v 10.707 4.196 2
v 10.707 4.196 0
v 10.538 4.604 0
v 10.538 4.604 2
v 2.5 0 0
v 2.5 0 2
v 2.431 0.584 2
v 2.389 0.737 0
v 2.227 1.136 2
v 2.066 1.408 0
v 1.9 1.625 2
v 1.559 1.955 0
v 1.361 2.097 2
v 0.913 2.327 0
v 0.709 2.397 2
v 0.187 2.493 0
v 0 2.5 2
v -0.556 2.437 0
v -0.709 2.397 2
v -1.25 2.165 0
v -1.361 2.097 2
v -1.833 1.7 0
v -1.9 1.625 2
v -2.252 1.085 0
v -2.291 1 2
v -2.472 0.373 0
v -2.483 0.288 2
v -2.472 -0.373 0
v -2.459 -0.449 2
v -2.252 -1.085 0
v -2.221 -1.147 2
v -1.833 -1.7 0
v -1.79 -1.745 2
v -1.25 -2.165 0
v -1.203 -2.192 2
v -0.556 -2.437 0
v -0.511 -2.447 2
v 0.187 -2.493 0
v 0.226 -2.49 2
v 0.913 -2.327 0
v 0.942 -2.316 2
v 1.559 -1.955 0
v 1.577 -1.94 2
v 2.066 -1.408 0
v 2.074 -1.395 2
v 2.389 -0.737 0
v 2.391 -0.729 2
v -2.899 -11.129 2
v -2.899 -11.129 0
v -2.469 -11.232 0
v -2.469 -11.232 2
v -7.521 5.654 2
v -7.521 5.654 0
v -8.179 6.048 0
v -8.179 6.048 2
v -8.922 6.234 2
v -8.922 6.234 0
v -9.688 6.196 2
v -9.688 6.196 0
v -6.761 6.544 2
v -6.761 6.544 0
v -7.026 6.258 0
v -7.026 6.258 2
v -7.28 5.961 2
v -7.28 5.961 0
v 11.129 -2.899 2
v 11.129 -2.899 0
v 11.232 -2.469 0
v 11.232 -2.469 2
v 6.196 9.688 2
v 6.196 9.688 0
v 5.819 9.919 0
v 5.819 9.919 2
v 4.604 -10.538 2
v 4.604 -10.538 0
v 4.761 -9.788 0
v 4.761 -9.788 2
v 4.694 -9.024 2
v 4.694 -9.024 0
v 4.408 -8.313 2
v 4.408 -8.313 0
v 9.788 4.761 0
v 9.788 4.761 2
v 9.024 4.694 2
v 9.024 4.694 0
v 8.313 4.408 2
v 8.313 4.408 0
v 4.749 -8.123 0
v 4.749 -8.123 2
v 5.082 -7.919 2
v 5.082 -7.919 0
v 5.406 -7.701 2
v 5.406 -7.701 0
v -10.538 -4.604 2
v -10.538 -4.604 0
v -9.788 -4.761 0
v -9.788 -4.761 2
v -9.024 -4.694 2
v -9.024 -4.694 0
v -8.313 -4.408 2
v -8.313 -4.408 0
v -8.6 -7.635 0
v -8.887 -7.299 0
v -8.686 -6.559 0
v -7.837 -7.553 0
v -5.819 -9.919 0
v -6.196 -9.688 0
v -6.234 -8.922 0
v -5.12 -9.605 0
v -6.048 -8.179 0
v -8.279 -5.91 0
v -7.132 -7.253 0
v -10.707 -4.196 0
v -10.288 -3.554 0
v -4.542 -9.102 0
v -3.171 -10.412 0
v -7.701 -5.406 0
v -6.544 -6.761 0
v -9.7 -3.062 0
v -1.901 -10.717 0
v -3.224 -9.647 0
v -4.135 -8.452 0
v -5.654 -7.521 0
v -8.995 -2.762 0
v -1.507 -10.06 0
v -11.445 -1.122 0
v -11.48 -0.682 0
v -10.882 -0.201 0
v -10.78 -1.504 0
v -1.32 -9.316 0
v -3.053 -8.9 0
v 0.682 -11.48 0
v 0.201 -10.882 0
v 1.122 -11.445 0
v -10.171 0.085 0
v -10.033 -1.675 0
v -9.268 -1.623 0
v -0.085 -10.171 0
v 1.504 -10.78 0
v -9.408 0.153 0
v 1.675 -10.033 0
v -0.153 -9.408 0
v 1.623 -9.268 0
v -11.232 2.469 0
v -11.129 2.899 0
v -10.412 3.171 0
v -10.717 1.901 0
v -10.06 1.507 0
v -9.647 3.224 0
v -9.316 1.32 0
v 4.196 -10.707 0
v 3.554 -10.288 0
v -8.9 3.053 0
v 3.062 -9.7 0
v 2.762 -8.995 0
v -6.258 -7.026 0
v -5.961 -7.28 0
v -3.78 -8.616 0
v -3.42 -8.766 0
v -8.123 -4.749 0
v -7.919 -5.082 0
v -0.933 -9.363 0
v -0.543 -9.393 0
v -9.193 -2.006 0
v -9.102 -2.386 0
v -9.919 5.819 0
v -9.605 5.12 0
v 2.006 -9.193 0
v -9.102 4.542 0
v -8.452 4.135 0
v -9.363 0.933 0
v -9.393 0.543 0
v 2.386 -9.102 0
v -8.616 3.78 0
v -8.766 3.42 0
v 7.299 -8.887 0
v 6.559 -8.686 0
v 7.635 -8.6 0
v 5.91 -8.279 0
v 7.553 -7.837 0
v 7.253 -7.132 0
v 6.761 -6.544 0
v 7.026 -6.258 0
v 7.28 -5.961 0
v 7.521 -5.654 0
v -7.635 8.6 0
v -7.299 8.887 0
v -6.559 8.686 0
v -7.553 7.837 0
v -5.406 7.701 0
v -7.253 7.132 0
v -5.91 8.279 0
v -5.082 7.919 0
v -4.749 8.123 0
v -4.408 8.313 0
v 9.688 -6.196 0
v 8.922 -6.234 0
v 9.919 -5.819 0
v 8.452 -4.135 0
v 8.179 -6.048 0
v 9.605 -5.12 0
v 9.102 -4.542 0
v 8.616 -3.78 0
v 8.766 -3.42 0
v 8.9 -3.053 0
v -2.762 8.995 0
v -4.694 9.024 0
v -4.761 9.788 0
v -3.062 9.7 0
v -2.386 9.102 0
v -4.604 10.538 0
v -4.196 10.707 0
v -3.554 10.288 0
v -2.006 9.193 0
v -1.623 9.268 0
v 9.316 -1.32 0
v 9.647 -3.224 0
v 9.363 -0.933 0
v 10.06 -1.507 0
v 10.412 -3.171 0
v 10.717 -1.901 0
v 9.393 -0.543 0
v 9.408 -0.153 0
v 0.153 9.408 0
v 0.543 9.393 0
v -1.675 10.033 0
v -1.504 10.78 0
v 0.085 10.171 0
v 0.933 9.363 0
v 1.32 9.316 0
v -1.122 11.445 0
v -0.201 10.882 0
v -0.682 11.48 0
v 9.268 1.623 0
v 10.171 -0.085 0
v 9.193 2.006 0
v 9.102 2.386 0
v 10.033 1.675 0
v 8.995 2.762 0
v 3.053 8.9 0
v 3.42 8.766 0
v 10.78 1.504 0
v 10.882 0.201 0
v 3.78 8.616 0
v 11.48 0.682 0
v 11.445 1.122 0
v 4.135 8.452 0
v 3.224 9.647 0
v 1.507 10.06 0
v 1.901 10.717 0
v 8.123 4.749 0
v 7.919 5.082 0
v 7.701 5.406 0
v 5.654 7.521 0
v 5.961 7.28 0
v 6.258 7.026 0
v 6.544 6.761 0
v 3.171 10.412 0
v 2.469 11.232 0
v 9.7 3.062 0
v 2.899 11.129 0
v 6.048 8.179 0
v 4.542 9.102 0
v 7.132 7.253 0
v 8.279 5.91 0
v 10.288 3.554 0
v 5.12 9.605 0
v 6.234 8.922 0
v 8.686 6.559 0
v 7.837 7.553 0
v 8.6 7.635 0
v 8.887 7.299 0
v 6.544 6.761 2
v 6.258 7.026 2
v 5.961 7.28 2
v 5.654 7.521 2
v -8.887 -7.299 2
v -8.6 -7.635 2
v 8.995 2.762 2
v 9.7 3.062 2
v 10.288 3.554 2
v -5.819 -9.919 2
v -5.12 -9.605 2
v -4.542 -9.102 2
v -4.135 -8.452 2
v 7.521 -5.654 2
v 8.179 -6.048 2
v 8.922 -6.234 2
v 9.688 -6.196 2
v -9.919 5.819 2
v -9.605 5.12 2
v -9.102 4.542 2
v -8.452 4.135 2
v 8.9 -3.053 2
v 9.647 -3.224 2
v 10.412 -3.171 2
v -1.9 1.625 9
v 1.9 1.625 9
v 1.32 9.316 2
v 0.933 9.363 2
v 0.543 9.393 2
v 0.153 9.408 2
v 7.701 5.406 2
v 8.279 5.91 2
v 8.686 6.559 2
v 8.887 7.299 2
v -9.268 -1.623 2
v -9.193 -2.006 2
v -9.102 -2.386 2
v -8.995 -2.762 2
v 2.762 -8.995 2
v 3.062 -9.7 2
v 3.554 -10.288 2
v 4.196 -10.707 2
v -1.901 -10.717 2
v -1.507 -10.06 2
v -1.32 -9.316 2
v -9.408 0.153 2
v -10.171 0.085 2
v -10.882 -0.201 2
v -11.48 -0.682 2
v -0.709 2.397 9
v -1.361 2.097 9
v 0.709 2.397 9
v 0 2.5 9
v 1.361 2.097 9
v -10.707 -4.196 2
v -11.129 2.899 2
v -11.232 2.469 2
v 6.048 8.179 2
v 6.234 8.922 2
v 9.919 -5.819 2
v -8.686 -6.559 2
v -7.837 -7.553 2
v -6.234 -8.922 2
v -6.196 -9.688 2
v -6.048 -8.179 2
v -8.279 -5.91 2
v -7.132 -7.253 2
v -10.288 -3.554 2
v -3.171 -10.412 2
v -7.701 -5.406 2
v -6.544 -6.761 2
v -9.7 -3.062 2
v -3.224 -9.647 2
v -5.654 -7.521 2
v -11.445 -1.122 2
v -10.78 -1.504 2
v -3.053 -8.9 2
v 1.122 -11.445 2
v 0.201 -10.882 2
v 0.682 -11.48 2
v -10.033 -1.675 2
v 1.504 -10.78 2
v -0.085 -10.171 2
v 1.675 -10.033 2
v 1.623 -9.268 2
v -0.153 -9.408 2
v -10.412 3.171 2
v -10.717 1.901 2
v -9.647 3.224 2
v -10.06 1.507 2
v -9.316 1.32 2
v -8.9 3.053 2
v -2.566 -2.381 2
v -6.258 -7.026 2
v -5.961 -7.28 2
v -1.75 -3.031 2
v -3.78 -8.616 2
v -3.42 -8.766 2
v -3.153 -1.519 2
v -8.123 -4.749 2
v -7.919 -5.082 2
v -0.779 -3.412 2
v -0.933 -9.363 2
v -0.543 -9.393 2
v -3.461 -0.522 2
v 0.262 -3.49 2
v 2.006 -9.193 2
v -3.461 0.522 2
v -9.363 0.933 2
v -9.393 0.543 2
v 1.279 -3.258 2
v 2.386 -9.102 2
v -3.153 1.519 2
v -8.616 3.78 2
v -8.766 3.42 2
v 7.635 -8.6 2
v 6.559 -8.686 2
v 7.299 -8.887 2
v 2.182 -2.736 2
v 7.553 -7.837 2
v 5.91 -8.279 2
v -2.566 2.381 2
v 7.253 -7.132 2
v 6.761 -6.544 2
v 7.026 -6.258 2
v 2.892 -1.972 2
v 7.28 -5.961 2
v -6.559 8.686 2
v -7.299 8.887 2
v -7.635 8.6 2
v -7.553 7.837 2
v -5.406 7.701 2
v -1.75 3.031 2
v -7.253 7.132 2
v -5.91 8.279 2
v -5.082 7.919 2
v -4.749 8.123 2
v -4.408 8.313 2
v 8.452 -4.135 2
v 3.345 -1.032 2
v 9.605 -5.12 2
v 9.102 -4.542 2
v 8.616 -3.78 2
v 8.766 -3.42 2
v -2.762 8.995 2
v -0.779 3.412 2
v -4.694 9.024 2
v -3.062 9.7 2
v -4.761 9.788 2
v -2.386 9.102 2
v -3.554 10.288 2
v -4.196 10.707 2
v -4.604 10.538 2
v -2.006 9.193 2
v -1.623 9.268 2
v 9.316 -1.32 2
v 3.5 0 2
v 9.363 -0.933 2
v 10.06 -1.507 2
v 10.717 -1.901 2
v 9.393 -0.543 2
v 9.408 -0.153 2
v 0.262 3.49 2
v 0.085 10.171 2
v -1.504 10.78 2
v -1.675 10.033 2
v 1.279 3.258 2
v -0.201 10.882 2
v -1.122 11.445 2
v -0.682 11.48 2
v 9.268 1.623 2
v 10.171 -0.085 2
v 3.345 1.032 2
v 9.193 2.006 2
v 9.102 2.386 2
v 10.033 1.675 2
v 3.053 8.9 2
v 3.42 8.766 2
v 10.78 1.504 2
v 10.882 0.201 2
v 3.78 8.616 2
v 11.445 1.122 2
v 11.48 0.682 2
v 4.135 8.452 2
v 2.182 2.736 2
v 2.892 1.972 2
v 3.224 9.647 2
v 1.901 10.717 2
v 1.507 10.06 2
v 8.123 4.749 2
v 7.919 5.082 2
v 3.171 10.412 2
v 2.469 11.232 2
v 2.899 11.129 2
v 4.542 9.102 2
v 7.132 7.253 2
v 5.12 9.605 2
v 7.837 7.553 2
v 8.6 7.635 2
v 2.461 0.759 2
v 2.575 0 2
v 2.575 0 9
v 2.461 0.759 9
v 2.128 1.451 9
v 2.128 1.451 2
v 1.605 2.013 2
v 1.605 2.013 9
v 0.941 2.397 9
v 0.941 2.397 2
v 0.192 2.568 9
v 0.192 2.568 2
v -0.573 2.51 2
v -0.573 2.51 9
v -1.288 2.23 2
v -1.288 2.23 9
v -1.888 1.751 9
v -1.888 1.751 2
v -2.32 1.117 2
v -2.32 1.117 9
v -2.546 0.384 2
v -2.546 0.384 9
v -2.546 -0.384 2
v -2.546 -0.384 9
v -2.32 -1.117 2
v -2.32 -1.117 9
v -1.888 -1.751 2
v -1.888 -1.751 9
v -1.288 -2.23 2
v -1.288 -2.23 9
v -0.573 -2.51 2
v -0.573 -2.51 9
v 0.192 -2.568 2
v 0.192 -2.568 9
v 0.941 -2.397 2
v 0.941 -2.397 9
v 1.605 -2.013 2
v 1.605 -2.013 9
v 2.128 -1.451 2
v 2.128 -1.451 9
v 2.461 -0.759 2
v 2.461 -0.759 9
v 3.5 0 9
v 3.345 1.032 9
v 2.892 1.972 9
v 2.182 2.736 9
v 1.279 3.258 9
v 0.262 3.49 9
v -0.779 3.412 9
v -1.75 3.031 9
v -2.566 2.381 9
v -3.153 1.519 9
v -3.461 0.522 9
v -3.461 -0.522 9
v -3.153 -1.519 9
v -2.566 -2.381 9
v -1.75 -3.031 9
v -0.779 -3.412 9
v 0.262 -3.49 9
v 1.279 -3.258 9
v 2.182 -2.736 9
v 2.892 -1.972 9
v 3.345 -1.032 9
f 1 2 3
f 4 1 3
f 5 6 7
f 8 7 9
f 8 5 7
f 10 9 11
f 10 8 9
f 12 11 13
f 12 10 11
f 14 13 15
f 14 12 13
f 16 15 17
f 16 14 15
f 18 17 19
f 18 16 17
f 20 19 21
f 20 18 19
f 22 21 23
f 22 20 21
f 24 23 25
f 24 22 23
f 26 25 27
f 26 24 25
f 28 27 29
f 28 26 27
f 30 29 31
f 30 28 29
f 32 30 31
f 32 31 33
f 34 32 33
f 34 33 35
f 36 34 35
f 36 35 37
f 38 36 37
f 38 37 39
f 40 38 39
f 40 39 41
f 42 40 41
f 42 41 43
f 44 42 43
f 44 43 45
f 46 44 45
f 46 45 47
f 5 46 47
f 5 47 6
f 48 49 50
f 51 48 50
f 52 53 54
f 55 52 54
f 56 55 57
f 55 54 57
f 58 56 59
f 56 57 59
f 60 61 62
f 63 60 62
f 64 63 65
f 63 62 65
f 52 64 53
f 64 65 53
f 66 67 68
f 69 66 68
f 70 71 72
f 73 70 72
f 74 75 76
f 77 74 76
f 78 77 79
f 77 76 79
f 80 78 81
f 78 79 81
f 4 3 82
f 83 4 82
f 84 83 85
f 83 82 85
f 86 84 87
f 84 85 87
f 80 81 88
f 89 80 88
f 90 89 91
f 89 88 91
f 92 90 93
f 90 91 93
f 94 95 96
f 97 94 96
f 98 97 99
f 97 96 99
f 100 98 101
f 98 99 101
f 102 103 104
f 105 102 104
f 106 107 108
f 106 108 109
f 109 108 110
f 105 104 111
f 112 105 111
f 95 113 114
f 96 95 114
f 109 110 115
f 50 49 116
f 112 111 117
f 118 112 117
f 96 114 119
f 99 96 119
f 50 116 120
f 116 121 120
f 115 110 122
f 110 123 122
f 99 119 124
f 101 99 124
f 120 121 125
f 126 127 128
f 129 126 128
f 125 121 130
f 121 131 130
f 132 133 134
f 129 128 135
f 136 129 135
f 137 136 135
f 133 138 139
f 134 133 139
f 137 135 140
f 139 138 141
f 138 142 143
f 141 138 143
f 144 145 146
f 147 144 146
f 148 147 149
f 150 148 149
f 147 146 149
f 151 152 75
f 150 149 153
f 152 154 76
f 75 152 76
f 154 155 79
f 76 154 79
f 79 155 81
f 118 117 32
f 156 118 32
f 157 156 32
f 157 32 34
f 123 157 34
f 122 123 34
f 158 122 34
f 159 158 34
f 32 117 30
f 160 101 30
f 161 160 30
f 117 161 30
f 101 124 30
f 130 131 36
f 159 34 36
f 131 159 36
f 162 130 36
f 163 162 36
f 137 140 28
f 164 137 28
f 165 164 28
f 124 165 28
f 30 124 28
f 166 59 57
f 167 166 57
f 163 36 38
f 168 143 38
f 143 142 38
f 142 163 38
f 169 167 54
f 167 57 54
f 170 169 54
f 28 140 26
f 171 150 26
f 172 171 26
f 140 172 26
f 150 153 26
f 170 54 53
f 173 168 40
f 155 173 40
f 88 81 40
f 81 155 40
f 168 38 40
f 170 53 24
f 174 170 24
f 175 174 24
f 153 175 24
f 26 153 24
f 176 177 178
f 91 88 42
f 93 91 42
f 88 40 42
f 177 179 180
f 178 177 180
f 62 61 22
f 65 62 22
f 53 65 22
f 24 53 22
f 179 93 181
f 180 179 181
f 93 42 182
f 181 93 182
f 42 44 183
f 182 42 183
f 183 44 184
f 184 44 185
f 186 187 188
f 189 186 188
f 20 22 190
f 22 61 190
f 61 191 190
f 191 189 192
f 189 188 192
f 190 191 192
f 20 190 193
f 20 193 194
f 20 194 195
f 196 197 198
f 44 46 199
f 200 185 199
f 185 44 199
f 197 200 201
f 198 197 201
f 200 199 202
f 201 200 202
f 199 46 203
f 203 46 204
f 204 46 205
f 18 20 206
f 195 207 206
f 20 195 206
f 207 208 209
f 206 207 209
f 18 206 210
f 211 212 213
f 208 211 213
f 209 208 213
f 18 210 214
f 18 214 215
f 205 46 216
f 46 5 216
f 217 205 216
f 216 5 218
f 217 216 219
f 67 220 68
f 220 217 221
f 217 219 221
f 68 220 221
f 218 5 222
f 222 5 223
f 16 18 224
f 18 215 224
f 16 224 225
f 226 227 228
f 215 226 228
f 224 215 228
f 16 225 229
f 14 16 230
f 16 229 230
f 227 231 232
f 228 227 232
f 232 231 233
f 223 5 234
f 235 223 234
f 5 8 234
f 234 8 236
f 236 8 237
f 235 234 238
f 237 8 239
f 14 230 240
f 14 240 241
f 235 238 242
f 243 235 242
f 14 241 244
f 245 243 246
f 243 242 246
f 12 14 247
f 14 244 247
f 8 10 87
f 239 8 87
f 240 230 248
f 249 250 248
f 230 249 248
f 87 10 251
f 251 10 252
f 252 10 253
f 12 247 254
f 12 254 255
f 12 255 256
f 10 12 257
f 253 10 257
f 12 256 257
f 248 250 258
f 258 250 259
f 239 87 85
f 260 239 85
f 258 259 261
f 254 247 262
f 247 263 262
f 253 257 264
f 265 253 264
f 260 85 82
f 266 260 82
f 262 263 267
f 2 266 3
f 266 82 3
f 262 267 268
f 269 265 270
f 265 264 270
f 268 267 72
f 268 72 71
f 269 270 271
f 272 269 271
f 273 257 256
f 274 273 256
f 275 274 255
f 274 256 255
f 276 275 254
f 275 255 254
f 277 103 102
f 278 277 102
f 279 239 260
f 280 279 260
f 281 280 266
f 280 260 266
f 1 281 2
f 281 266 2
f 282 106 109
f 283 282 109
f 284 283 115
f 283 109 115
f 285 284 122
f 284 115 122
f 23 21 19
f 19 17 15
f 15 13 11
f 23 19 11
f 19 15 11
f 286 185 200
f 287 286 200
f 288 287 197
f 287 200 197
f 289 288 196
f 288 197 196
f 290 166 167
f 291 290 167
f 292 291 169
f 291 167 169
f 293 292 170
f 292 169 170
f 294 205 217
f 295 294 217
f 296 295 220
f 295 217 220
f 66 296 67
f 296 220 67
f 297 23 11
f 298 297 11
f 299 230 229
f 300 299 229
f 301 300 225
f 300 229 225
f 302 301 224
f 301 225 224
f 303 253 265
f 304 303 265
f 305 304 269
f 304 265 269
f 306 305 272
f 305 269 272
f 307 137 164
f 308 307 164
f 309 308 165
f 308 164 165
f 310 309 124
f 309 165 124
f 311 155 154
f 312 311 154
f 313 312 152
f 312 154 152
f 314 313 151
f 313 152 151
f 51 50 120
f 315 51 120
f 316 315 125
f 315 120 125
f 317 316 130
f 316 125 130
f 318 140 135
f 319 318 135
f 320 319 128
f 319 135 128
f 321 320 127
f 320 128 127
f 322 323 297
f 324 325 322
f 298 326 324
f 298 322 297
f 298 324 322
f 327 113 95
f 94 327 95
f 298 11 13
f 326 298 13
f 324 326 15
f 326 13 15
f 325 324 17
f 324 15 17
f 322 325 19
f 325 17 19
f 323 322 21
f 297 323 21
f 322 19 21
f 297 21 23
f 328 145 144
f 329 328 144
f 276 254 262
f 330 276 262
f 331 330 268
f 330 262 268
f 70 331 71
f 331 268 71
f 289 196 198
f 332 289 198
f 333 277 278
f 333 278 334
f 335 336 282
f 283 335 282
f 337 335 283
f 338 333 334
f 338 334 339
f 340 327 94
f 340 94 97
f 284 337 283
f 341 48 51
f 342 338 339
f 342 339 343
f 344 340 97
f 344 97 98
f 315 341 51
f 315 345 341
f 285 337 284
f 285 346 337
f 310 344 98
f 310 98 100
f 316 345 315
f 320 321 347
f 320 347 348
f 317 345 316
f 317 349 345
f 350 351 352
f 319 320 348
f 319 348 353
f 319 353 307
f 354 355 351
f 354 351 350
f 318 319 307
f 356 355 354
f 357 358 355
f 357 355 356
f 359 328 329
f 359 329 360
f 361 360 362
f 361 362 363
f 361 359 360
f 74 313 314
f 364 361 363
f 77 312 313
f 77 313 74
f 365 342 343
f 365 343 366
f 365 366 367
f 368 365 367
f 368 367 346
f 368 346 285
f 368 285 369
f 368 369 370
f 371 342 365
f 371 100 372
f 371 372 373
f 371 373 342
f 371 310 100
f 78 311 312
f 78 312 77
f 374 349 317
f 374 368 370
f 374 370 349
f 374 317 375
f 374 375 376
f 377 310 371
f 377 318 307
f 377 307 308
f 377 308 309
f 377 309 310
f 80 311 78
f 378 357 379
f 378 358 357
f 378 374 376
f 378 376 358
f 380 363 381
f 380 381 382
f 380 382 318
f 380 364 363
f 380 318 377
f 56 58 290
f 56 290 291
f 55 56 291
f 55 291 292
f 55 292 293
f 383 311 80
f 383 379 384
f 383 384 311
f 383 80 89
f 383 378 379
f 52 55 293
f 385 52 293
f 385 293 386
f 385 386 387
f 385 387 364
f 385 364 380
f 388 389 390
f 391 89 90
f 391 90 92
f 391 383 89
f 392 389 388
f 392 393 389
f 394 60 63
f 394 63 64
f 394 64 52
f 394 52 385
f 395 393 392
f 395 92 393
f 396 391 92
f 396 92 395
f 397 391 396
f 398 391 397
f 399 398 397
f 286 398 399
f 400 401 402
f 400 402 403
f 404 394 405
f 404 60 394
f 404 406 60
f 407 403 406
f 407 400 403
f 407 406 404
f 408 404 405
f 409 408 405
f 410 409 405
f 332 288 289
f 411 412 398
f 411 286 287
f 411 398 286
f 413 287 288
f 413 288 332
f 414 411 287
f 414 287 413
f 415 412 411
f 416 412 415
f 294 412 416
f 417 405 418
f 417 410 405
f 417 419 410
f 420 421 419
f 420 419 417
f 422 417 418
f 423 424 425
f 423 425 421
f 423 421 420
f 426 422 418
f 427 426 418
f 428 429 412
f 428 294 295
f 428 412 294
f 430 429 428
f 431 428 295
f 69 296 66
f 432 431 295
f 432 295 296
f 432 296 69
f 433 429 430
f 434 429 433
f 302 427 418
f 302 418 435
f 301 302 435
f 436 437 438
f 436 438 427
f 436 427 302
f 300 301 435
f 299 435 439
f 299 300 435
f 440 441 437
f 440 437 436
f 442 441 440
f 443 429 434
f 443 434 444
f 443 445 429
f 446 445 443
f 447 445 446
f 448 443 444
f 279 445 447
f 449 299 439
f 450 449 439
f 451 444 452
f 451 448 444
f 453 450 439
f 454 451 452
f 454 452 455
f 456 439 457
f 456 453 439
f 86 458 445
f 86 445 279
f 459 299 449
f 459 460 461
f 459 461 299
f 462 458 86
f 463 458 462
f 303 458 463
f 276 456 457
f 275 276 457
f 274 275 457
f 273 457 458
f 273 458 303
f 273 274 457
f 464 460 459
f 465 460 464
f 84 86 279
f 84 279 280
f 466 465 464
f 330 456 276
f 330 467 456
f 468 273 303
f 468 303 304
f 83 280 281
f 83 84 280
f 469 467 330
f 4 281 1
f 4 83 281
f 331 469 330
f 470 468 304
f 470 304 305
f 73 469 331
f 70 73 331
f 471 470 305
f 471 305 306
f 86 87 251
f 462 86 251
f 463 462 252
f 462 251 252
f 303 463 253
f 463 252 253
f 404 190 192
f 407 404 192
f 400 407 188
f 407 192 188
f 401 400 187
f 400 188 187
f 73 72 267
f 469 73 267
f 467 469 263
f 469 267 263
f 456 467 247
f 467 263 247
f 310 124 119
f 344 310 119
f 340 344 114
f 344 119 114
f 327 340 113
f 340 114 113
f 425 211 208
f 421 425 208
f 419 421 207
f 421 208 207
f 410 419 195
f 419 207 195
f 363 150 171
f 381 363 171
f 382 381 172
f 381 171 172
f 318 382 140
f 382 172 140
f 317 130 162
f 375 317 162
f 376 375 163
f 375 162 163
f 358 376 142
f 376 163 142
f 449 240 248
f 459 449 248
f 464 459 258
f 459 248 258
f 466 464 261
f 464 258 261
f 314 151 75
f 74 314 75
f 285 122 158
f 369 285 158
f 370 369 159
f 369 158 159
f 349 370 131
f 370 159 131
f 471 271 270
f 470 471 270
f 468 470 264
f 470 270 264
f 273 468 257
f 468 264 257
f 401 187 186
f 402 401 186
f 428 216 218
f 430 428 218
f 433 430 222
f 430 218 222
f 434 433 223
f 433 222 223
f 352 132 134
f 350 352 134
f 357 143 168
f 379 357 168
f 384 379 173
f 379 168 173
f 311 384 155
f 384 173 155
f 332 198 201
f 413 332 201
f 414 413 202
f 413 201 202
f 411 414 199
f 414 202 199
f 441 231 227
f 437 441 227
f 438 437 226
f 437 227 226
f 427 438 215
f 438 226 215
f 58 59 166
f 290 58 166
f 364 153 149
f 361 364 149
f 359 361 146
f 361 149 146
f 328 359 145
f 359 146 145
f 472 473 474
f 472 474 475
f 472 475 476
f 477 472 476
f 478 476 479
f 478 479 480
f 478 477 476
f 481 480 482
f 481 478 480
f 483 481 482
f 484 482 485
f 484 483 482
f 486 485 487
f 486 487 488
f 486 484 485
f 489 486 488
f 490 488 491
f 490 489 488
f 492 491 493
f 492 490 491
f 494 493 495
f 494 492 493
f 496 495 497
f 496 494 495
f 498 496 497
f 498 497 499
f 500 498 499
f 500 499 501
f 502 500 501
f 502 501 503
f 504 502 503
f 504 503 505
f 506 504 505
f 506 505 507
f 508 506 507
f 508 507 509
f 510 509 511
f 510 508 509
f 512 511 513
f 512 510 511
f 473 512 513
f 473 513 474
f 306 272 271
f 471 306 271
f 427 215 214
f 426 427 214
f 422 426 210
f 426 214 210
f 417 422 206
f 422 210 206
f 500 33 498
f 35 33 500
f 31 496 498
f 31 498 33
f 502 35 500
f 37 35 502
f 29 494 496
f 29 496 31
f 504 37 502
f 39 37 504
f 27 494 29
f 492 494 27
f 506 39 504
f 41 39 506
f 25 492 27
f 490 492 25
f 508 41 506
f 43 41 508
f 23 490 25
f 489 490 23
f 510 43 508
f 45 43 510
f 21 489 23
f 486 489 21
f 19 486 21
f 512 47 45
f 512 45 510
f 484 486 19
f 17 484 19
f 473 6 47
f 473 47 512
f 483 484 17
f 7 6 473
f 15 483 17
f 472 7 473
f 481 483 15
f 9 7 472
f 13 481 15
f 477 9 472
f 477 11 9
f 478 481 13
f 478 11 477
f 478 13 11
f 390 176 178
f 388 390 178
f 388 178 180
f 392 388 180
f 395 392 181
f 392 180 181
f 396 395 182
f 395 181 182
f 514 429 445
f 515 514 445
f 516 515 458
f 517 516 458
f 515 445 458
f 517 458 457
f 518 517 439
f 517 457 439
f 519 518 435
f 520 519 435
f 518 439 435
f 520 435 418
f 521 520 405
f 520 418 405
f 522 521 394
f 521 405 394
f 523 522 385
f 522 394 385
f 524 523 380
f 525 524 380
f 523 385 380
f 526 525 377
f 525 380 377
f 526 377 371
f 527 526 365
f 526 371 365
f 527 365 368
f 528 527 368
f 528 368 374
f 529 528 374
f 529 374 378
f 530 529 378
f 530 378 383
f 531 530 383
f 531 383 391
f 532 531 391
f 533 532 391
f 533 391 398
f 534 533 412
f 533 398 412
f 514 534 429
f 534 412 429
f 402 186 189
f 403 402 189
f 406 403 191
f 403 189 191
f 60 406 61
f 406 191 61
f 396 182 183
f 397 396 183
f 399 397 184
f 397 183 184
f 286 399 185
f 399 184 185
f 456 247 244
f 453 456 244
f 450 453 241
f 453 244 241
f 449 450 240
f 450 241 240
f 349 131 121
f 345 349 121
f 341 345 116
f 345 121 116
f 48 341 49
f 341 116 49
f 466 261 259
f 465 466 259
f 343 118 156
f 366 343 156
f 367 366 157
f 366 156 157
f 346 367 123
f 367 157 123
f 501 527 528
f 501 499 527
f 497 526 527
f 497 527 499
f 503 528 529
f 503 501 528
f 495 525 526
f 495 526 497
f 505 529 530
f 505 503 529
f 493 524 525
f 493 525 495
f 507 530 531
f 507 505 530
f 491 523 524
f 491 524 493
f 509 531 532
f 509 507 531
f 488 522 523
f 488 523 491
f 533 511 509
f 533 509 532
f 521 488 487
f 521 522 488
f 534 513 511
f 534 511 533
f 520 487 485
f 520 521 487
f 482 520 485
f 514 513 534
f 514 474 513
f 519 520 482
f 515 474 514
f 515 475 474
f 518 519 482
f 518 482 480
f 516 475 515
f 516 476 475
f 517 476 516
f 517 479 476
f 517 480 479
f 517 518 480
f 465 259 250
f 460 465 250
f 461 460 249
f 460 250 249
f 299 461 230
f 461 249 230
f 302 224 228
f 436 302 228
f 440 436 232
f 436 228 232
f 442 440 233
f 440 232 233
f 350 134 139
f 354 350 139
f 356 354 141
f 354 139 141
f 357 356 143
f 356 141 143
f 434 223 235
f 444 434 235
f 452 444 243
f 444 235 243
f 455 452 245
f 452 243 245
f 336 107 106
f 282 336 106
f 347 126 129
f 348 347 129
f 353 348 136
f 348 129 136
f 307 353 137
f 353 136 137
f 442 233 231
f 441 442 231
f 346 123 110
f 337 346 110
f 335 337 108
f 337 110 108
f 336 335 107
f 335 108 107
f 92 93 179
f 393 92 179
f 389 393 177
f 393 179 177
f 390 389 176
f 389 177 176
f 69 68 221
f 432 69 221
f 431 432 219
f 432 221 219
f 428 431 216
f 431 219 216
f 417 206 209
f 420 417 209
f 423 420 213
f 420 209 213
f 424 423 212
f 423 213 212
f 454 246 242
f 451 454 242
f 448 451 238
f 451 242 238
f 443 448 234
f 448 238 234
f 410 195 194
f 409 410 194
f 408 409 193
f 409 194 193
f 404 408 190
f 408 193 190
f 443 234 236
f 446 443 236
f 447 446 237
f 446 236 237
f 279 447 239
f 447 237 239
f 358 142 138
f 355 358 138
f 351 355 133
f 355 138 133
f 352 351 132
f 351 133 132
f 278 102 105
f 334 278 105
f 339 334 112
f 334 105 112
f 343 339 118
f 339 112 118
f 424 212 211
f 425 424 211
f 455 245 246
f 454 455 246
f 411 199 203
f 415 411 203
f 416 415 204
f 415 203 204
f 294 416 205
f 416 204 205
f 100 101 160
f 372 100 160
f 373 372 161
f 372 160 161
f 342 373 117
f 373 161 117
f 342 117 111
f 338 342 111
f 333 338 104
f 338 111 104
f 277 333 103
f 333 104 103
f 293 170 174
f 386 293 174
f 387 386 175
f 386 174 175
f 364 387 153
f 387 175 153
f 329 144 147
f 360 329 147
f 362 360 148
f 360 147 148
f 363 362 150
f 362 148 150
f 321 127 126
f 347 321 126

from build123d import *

# Parameters (mm, degrees)
F1_R     = 2.5
F2_DEPTH = 2
F3_R     = 3.5
F3_R_2   = 2.575
F4_DEPTH = 7


with BuildPart() as f2:
    # F1 (on Top) → F2 (new body)
    with BuildSketch(Plane.XY):
        with BuildLine():
            ThreePointArc((-1.6229776334, 9.2680599554), (-0.7382287643, 9.3800858219), (0.1531520845, 9.4078443957))
            ThreePointArc((0.1531520845, 9.4078443957), (-0.0317997207, 10.5374998224), (-0.6817601701, 11.4797736507))
            Line((-0.6817601701, 11.4797736507), (-1.1224656787, 11.4450893749))
            ThreePointArc((-1.1224656787, 11.4450893749), (-1.6170199342, 10.4127402859), (-1.6229776334, 9.2680599554))
        make_face()
        with BuildLine():
            ThreePointArc((9.4078443957, -0.1531520845), (9.4087792756, -0.0765785786), (9.4090909091, 0))
            ThreePointArc((9.4090909091, 0), (9.3737668631, 0.8145468262), (9.2680599554, 1.6229776334))
            ThreePointArc((9.2680599554, 1.6229776334), (9.1491169783, 2.1965086508), (8.9947183137, 2.7615275108))
            ThreePointArc((8.9947183137, 2.7615275108), (8.6928665104, 3.6007032045), (8.3129211438, 4.4075314852))
            ThreePointArc((8.3129211438, 4.4075314852), (8.0225688191, 4.9162364953), (7.7011265332, 5.4058895526))
            ThreePointArc((7.7011265332, 5.4058895526), (7.1547288581, 6.1107157275), (6.5440556911, 6.7606454461))
            ThreePointArc((6.5440556911, 6.7606454461), (6.1107157275, 7.1547288581), (5.6536948308, 7.52108546))
            ThreePointArc((5.6536948308, 7.52108546), (4.9162364953, 8.0225688191), (4.1346124722, 8.4519803265))
            ThreePointArc((4.1346124722, 8.4519803265), (3.6007032045, 8.6928665104), (3.0528400867, 8.90006512))
            ThreePointArc((3.0528400867, 8.90006512), (2.1965086508, 9.1491169783), (1.320444577, 9.3159764842))
            ThreePointArc((1.320444577, 9.3159764842), (0.7382287643, 9.3800858219), (0.1531520845, 9.4078443957))
            ThreePointArc((0.1531520845, 9.4078443957), (-0.7382287643, 9.3800858219), (-1.6229776334, 9.2680599554))
            ThreePointArc((-1.6229776334, 9.2680599554), (-2.1965086508, 9.1491169783), (-2.7615275108, 8.9947183137))
            ThreePointArc((-2.7615275108, 8.9947183137), (-3.6007032045, 8.6928665104), (-4.4075314852, 8.3129211438))
            ThreePointArc((-4.4075314852, 8.3129211438), (-4.9162364953, 8.0225688191), (-5.4058895526, 7.7011265332))
            ThreePointArc((-5.4058895526, 7.7011265332), (-6.1107157275, 7.1547288581), (-6.7606454461, 6.5440556911))
            ThreePointArc((-6.7606454461, 6.5440556911), (-7.1547288581, 6.1107157275), (-7.52108546, 5.6536948308))
            ThreePointArc((-7.52108546, 5.6536948308), (-8.0225688191, 4.9162364953), (-8.4519803265, 4.1346124722))
            ThreePointArc((-8.4519803265, 4.1346124722), (-8.6928665104, 3.6007032045), (-8.90006512, 3.0528400867))
            ThreePointArc((-8.90006512, 3.0528400867), (-9.1491169783, 2.1965086508), (-9.3159764842, 1.320444577))
            ThreePointArc((-9.3159764842, 1.320444577), (-9.3800858219, 0.7382287643), (-9.4078443957, 0.1531520845))
            ThreePointArc((-9.4078443957, 0.1531520845), (-9.3800858219, -0.7382287643), (-9.2680599554, -1.6229776334))
            ThreePointArc((-9.2680599554, -1.6229776334), (-9.1491169783, -2.1965086508), (-8.9947183137, -2.7615275108))
            ThreePointArc((-8.9947183137, -2.7615275108), (-8.6928665104, -3.6007032045), (-8.3129211438, -4.4075314852))
            ThreePointArc((-8.3129211438, -4.4075314852), (-8.0225688191, -4.9162364953), (-7.7011265332, -5.4058895526))
            ThreePointArc((-7.7011265332, -5.4058895526), (-7.1547288581, -6.1107157275), (-6.5440556911, -6.7606454461))
            ThreePointArc((-6.5440556911, -6.7606454461), (-6.1107157275, -7.1547288581), (-5.6536948308, -7.52108546))
            ThreePointArc((-5.6536948308, -7.52108546), (-4.9162364953, -8.0225688191), (-4.1346124722, -8.4519803265))
            ThreePointArc((-4.1346124722, -8.4519803265), (-3.6007032045, -8.6928665104), (-3.0528400867, -8.90006512))
            ThreePointArc((-3.0528400867, -8.90006512), (-2.1965086508, -9.1491169783), (-1.320444577, -9.3159764842))
            ThreePointArc((-1.320444577, -9.3159764842), (-0.7382287643, -9.3800858219), (-0.1531520845, -9.4078443957))
            ThreePointArc((-0.1531520845, -9.4078443957), (0.7382287643, -9.3800858219), (1.6229776334, -9.2680599554))
            ThreePointArc((1.6229776334, -9.2680599554), (2.1965086508, -9.1491169783), (2.7615275108, -8.9947183137))
            ThreePointArc((2.7615275108, -8.9947183137), (3.6007032045, -8.6928665104), (4.4075314852, -8.3129211438))
            ThreePointArc((4.4075314852, -8.3129211438), (4.9162364953, -8.0225688191), (5.4058895526, -7.7011265332))
            ThreePointArc((5.4058895526, -7.7011265332), (6.1107157275, -7.1547288581), (6.7606454461, -6.5440556911))
            ThreePointArc((6.7606454461, -6.5440556911), (7.1547288581, -6.1107157275), (7.52108546, -5.6536948308))
            ThreePointArc((7.52108546, -5.6536948308), (8.0225688191, -4.9162364953), (8.4519803265, -4.1346124722))
            ThreePointArc((8.4519803265, -4.1346124722), (8.6928665104, -3.6007032045), (8.90006512, -3.0528400867))
            ThreePointArc((8.90006512, -3.0528400867), (9.1491169783, -2.1965086508), (9.3159764842, -1.320444577))
            ThreePointArc((9.3159764842, -1.320444577), (9.3800858219, -0.7382287643), (9.4078443957, -0.1531520845))
        make_face()
        Circle(F1_R, mode=Mode.SUBTRACT)
        with BuildLine():
            ThreePointArc((-4.4075314852, 8.3129211438), (-3.6007032045, 8.6928665104), (-2.7615275108, 8.9947183137))
            ThreePointArc((-2.7615275108, 8.9947183137), (-3.286509855, 10.0119312174), (-4.195837602, 10.7072380574))
            Line((-4.195837602, 10.7072380574), (-4.604255417, 10.5380658593))
            ThreePointArc((-4.604255417, 10.5380658593), (-4.7555910517, 9.4034178615), (-4.4075314852, 8.3129211438))
        make_face()
        with BuildLine():
            ThreePointArc((-6.7606454461, 6.5440556911), (-6.1107157275, 7.1547288581), (-5.4058895526, 7.7011265332))
            ThreePointArc((-5.4058895526, 7.7011265332), (-6.2195135061, 8.5063250277), (-7.2991972152, 8.8866034014))
            Line((-7.2991972152, 8.8866034014), (-7.6353485554, 8.5995030343))
            ThreePointArc((-7.6353485554, 8.5995030343), (-7.428651783, 7.4736233793), (-6.7606454461, 6.5440556911))
        make_face()
        with BuildLine():
            ThreePointArc((-8.4519803265, 4.1346124722), (-8.0225688191, 4.9162364953), (-7.52108546, 5.6536948308))
            ThreePointArc((-7.52108546, 5.6536948308), (-8.5437078414, 6.1680604771), (-9.6880605486, 6.1960860878))
            Line((-9.6880605486, 6.1960860878), (-9.9190405786, 5.8191609361))
            ThreePointArc((-9.9190405786, 5.8191609361), (-9.3745443193, 4.812258569), (-8.4519803265, 4.1346124722))
        make_face()
        with BuildLine():
            ThreePointArc((-9.3159764842, 1.320444577), (-9.1491169783, 2.1965086508), (-8.90006512, 3.0528400867))
            ThreePointArc((-8.90006512, 3.0528400867), (-10.0315845257, 3.2260231917), (-11.1285890147, 2.8990526973))
            Line((-11.1285890147, 2.8990526973), (-11.2317877999, 2.469198821))
            ThreePointArc((-11.2317877999, 2.469198821), (-10.4027911413, 1.679836361), (-9.3159764842, 1.320444577))
        make_face()
        with BuildLine():
            ThreePointArc((-9.2680599554, -1.6229776334), (-9.3800858219, -0.7382287643), (-9.4078443957, 0.1531520845))
            ThreePointArc((-9.4078443957, 0.1531520845), (-10.5374998224, -0.0317997207), (-11.4797736507, -0.6817601701))
            Line((-11.4797736507, -0.6817601701), (-11.4450893749, -1.1224656787))
            ThreePointArc((-11.4450893749, -1.1224656787), (-10.4127402859, -1.6170199342), (-9.2680599554, -1.6229776334))
        make_face()
        with BuildLine():
            ThreePointArc((-10.5380658593, -4.604255417), (-9.4034178615, -4.7555910517), (-8.3129211438, -4.4075314852))
            ThreePointArc((-8.3129211438, -4.4075314852), (-8.6928665104, -3.6007032045), (-8.9947183137, -2.7615275108))
            ThreePointArc((-8.9947183137, -2.7615275108), (-10.0119312174, -3.286509855), (-10.7072380574, -4.195837602))
            Line((-10.7072380574, -4.195837602), (-10.5380658593, -4.604255417))
        make_face()
        with BuildLine():
            ThreePointArc((-8.5995030343, -7.6353485554), (-7.4736233793, -7.428651783), (-6.5440556911, -6.7606454461))
            ThreePointArc((-6.5440556911, -6.7606454461), (-7.1547288581, -6.1107157275), (-7.7011265332, -5.4058895526))
            ThreePointArc((-7.7011265332, -5.4058895526), (-8.5063250277, -6.2195135061), (-8.8866034014, -7.2991972152))
            Line((-8.8866034014, -7.2991972152), (-8.5995030343, -7.6353485554))
        make_face()
        with BuildLine():
            ThreePointArc((-5.8191609361, -9.9190405786), (-4.812258569, -9.3745443193), (-4.1346124722, -8.4519803265))
            ThreePointArc((-4.1346124722, -8.4519803265), (-4.9162364953, -8.0225688191), (-5.6536948308, -7.52108546))
            ThreePointArc((-5.6536948308, -7.52108546), (-6.1680604771, -8.5437078414), (-6.1960860878, -9.6880605486))
            Line((-6.1960860878, -9.6880605486), (-5.8191609361, -9.9190405786))
        make_face()
        with BuildLine():
            ThreePointArc((-2.469198821, -11.2317877999), (-1.679836361, -10.4027911413), (-1.320444577, -9.3159764842))
            ThreePointArc((-1.320444577, -9.3159764842), (-2.1965086508, -9.1491169783), (-3.0528400867, -8.90006512))
            ThreePointArc((-3.0528400867, -8.90006512), (-3.2260231917, -10.0315845257), (-2.8990526973, -11.1285890147))
            Line((-2.8990526973, -11.1285890147), (-2.469198821, -11.2317877999))
        make_face()
        with BuildLine():
            ThreePointArc((1.1224656787, -11.4450893749), (1.6170199342, -10.4127402859), (1.6229776334, -9.2680599554))
            ThreePointArc((1.6229776334, -9.2680599554), (0.7382287643, -9.3800858219), (-0.1531520845, -9.4078443957))
            ThreePointArc((-0.1531520845, -9.4078443957), (0.0317997207, -10.5374998224), (0.6817601701, -11.4797736507))
            Line((0.6817601701, -11.4797736507), (1.1224656787, -11.4450893749))
        make_face()
        with BuildLine():
            ThreePointArc((4.604255417, -10.5380658593), (4.7555910517, -9.4034178615), (4.4075314852, -8.3129211438))
            ThreePointArc((4.4075314852, -8.3129211438), (3.6007032045, -8.6928665104), (2.7615275108, -8.9947183137))
            ThreePointArc((2.7615275108, -8.9947183137), (3.286509855, -10.0119312174), (4.195837602, -10.7072380574))
            Line((4.195837602, -10.7072380574), (4.604255417, -10.5380658593))
        make_face()
        with BuildLine():
            ThreePointArc((7.6353485554, -8.5995030343), (7.428651783, -7.4736233793), (6.7606454461, -6.5440556911))
            ThreePointArc((6.7606454461, -6.5440556911), (6.1107157275, -7.1547288581), (5.4058895526, -7.7011265332))
            ThreePointArc((5.4058895526, -7.7011265332), (6.2195135061, -8.5063250277), (7.2991972152, -8.8866034014))
            Line((7.2991972152, -8.8866034014), (7.6353485554, -8.5995030343))
        make_face()
        with BuildLine():
            ThreePointArc((9.9190405786, -5.8191609361), (9.3745443193, -4.812258569), (8.4519803265, -4.1346124722))
            ThreePointArc((8.4519803265, -4.1346124722), (8.0225688191, -4.9162364953), (7.52108546, -5.6536948308))
            ThreePointArc((7.52108546, -5.6536948308), (8.5437078414, -6.1680604771), (9.6880605486, -6.1960860878))
            Line((9.6880605486, -6.1960860878), (9.9190405786, -5.8191609361))
        make_face()
        with BuildLine():
            ThreePointArc((11.2317877999, -2.469198821), (10.4027911413, -1.679836361), (9.3159764842, -1.320444577))
            ThreePointArc((9.3159764842, -1.320444577), (9.1491169783, -2.1965086508), (8.90006512, -3.0528400867))
            ThreePointArc((8.90006512, -3.0528400867), (10.0315845257, -3.2260231917), (11.1285890147, -2.8990526973))
            Line((11.1285890147, -2.8990526973), (11.2317877999, -2.469198821))
        make_face()
        with BuildLine():
            ThreePointArc((9.2680599554, 1.6229776334), (9.3737668631, 0.8145468262), (9.4090909091, 0))
            ThreePointArc((9.4090909091, 0), (9.4087792756, -0.0765785786), (9.4078443957, -0.1531520845))
            ThreePointArc((9.4078443957, -0.1531520845), (10.5374998224, 0.0317997207), (11.4797736507, 0.6817601701))
            Line((11.4797736507, 0.6817601701), (11.4450893749, 1.1224656787))
            ThreePointArc((11.4450893749, 1.1224656787), (10.4127402859, 1.6170199342), (9.2680599554, 1.6229776334))
        make_face()
        with BuildLine():
            ThreePointArc((8.3129211438, 4.4075314852), (8.6928665104, 3.6007032045), (8.9947183137, 2.7615275108))
            ThreePointArc((8.9947183137, 2.7615275108), (10.0119312174, 3.286509855), (10.7072380574, 4.195837602))
            Line((10.7072380574, 4.195837602), (10.5380658593, 4.604255417))
            ThreePointArc((10.5380658593, 4.604255417), (9.4034178615, 4.7555910517), (8.3129211438, 4.4075314852))
        make_face()
        with BuildLine():
            ThreePointArc((6.5440556911, 6.7606454461), (7.1547288581, 6.1107157275), (7.7011265332, 5.4058895526))
            ThreePointArc((7.7011265332, 5.4058895526), (8.5063250277, 6.2195135061), (8.8866034014, 7.2991972152))
            Line((8.8866034014, 7.2991972152), (8.5995030343, 7.6353485554))
            ThreePointArc((8.5995030343, 7.6353485554), (7.4736233793, 7.428651783), (6.5440556911, 6.7606454461))
        make_face()
        with BuildLine():
            ThreePointArc((4.1346124722, 8.4519803265), (4.9162364953, 8.0225688191), (5.6536948308, 7.52108546))
            ThreePointArc((5.6536948308, 7.52108546), (6.1680604771, 8.5437078414), (6.1960860878, 9.6880605486))
            Line((6.1960860878, 9.6880605486), (5.8191609361, 9.9190405786))
            ThreePointArc((5.8191609361, 9.9190405786), (4.812258569, 9.3745443193), (4.1346124722, 8.4519803265))
        make_face()
        with BuildLine():
            ThreePointArc((1.320444577, 9.3159764842), (2.1965086508, 9.1491169783), (3.0528400867, 8.90006512))
            ThreePointArc((3.0528400867, 8.90006512), (3.2260231917, 10.0315845257), (2.8990526973, 11.1285890147))
            Line((2.8990526973, 11.1285890147), (2.469198821, 11.2317877999))
            ThreePointArc((2.469198821, 11.2317877999), (1.679836361, 10.4027911413), (1.320444577, 9.3159764842))
        make_face()
    extrude(amount=F2_DEPTH)

    # F3 (on face) → F4 (join)
    with BuildSketch(Plane.XY.offset(2)):
        Circle(F3_R)
        Circle(F3_R_2, mode=Mode.SUBTRACT)
        with BuildLine():
            ThreePointArc((1.8998355192, 1.625), (0, 2.5), (-1.8998355192, 1.625))
            Line((-1.8998355192, 1.625), (1.8998355192, 1.625))
        make_face()
    extrude(amount=F4_DEPTH)


solid = f2.part
